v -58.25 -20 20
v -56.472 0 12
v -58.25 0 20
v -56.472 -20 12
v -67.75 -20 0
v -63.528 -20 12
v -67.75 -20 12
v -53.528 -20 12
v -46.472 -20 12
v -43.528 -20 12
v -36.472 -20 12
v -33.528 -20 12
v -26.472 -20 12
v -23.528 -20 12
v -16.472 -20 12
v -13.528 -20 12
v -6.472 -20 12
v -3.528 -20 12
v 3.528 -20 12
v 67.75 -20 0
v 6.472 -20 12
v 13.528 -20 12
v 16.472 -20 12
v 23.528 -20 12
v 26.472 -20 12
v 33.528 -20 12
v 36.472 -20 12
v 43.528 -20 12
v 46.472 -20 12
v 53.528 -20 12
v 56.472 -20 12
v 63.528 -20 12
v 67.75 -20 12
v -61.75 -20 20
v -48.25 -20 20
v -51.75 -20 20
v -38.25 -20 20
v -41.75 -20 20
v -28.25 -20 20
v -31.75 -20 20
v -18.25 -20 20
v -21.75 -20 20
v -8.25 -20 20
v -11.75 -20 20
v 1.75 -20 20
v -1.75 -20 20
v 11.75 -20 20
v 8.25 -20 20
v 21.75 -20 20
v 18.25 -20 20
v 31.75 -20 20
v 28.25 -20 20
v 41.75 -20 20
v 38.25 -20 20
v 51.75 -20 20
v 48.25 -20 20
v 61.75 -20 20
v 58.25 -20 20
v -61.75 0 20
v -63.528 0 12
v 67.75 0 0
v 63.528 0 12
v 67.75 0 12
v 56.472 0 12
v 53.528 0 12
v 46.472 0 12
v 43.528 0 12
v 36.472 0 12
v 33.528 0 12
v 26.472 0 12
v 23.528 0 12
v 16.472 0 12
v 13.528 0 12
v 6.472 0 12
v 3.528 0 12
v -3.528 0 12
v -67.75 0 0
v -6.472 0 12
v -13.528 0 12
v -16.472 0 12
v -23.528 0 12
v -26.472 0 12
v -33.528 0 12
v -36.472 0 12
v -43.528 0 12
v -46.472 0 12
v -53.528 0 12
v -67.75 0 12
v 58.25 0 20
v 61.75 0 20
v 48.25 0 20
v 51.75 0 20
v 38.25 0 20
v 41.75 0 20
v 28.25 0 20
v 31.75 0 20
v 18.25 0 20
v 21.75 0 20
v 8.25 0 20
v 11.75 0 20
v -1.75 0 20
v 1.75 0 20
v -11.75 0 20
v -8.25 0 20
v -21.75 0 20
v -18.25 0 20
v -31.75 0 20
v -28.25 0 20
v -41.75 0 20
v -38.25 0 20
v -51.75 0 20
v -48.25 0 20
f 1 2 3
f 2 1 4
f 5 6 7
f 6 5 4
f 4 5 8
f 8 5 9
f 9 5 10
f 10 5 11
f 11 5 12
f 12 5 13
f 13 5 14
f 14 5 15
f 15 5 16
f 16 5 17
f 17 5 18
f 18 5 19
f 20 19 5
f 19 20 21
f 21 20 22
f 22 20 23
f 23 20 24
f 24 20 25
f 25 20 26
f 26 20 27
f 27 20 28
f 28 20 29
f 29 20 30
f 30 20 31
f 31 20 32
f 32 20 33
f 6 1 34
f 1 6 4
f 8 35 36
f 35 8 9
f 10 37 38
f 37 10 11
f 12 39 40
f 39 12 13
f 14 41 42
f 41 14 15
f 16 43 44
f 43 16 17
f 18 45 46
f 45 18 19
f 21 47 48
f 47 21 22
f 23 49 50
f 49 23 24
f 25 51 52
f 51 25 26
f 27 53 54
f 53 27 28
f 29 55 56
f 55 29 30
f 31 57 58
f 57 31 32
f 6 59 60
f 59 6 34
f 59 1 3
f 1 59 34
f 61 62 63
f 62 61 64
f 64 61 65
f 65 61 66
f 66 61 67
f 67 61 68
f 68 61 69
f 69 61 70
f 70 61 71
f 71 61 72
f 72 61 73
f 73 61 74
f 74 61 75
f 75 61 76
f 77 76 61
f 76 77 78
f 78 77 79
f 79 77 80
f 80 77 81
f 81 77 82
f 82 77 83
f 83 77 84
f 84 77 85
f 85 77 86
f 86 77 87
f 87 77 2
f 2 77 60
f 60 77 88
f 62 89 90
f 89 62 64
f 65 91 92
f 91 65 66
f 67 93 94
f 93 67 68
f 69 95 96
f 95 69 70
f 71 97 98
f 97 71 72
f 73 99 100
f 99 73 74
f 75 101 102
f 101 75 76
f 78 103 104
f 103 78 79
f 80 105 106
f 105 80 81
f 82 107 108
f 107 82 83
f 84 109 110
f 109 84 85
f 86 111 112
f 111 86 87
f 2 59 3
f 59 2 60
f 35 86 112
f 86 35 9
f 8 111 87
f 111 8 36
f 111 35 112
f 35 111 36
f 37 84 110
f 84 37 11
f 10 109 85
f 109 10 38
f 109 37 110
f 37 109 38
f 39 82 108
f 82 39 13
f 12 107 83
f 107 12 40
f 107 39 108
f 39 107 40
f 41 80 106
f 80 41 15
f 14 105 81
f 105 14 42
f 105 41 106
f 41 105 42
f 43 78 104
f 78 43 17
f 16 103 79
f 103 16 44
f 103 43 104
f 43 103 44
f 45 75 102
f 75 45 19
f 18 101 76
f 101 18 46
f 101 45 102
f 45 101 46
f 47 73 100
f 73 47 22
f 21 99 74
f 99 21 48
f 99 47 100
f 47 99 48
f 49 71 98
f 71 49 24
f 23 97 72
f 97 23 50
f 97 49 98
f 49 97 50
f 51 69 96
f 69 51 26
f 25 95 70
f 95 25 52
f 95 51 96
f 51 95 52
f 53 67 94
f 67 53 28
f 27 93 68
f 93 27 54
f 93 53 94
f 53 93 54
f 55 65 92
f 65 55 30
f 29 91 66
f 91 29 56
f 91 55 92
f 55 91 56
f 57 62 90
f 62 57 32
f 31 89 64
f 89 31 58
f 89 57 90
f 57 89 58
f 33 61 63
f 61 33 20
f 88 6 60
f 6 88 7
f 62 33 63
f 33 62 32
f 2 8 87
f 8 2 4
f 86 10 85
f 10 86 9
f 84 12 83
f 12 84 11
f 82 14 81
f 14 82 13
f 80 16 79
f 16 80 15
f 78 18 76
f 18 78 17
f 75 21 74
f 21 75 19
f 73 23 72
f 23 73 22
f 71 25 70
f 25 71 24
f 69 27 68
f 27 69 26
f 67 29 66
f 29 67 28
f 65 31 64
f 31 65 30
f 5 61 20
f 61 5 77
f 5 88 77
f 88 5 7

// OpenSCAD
$fn = 32;

// ----------------------------------------------------------------------
// Toothed rack, 13 teeth
// 10 mm pitch, 8 mm teeth
// ----------------------------------------------------------------------

// --- parameters (mm) ---
bar_w = 20;     // bar width (Y)
bar_h = 12;     // bar height (Z)
teeth = 13;     // number of teeth
pitch = 10;     // tooth pitch
tooth_h = 8;    // tooth height above the bar
root_w = 7.5;   // tooth width at the root
crest_w = 3.5;  // tooth width at the crest

// --- derived feature positions (mm) ---
span = (teeth - 1) * pitch;  // = 120   distance between the outer teeth
bar_l = span + root_w + 8;   // = 135.5   bar length: teeth plus 4 mm at each end
tooth_x = -span / 2;         // = -60   X of the first tooth
height = bar_h + tooth_h;    // = 20   overall height
feature_centers = [
  [tooth_x + 0 * pitch, -bar_w / 2],
  [tooth_x + 1 * pitch, -bar_w / 2],
  [tooth_x + 2 * pitch, -bar_w / 2],
  [tooth_x + 3 * pitch, -bar_w / 2],
  [tooth_x + 4 * pitch, -bar_w / 2],
  [tooth_x + 5 * pitch, -bar_w / 2],
  [tooth_x + 6 * pitch, -bar_w / 2],
  [tooth_x + 7 * pitch, -bar_w / 2],
  [tooth_x + 8 * pitch, -bar_w / 2],
  [tooth_x + 9 * pitch, -bar_w / 2],
  [tooth_x + 10 * pitch, -bar_w / 2],
  [tooth_x + 11 * pitch, -bar_w / 2],
  [tooth_x + 12 * pitch, -bar_w / 2]
];   // tooth centre line, drives the tooth loop

// bar with a rack of teeth, one extruded trapezoium per centre
module rack_tooth() {
  linear_extrude(height = bar_w)
    polygon(points = [
      [0, 0],
      [root_w, 0],
      [root_w / 2 + crest_w / 2, tooth_h + 1],
      [root_w / 2 - crest_w / 2, tooth_h + 1]
    ]);
}

union() {
  translate([-bar_l / 2, -bar_w, 0]) cube([bar_l, bar_w, bar_h]);
  for (centre = feature_centers)
    translate([centre[0] - root_w / 2, 0, bar_h - 1]) rotate([90, 0, 0]) rack_tooth();
}
